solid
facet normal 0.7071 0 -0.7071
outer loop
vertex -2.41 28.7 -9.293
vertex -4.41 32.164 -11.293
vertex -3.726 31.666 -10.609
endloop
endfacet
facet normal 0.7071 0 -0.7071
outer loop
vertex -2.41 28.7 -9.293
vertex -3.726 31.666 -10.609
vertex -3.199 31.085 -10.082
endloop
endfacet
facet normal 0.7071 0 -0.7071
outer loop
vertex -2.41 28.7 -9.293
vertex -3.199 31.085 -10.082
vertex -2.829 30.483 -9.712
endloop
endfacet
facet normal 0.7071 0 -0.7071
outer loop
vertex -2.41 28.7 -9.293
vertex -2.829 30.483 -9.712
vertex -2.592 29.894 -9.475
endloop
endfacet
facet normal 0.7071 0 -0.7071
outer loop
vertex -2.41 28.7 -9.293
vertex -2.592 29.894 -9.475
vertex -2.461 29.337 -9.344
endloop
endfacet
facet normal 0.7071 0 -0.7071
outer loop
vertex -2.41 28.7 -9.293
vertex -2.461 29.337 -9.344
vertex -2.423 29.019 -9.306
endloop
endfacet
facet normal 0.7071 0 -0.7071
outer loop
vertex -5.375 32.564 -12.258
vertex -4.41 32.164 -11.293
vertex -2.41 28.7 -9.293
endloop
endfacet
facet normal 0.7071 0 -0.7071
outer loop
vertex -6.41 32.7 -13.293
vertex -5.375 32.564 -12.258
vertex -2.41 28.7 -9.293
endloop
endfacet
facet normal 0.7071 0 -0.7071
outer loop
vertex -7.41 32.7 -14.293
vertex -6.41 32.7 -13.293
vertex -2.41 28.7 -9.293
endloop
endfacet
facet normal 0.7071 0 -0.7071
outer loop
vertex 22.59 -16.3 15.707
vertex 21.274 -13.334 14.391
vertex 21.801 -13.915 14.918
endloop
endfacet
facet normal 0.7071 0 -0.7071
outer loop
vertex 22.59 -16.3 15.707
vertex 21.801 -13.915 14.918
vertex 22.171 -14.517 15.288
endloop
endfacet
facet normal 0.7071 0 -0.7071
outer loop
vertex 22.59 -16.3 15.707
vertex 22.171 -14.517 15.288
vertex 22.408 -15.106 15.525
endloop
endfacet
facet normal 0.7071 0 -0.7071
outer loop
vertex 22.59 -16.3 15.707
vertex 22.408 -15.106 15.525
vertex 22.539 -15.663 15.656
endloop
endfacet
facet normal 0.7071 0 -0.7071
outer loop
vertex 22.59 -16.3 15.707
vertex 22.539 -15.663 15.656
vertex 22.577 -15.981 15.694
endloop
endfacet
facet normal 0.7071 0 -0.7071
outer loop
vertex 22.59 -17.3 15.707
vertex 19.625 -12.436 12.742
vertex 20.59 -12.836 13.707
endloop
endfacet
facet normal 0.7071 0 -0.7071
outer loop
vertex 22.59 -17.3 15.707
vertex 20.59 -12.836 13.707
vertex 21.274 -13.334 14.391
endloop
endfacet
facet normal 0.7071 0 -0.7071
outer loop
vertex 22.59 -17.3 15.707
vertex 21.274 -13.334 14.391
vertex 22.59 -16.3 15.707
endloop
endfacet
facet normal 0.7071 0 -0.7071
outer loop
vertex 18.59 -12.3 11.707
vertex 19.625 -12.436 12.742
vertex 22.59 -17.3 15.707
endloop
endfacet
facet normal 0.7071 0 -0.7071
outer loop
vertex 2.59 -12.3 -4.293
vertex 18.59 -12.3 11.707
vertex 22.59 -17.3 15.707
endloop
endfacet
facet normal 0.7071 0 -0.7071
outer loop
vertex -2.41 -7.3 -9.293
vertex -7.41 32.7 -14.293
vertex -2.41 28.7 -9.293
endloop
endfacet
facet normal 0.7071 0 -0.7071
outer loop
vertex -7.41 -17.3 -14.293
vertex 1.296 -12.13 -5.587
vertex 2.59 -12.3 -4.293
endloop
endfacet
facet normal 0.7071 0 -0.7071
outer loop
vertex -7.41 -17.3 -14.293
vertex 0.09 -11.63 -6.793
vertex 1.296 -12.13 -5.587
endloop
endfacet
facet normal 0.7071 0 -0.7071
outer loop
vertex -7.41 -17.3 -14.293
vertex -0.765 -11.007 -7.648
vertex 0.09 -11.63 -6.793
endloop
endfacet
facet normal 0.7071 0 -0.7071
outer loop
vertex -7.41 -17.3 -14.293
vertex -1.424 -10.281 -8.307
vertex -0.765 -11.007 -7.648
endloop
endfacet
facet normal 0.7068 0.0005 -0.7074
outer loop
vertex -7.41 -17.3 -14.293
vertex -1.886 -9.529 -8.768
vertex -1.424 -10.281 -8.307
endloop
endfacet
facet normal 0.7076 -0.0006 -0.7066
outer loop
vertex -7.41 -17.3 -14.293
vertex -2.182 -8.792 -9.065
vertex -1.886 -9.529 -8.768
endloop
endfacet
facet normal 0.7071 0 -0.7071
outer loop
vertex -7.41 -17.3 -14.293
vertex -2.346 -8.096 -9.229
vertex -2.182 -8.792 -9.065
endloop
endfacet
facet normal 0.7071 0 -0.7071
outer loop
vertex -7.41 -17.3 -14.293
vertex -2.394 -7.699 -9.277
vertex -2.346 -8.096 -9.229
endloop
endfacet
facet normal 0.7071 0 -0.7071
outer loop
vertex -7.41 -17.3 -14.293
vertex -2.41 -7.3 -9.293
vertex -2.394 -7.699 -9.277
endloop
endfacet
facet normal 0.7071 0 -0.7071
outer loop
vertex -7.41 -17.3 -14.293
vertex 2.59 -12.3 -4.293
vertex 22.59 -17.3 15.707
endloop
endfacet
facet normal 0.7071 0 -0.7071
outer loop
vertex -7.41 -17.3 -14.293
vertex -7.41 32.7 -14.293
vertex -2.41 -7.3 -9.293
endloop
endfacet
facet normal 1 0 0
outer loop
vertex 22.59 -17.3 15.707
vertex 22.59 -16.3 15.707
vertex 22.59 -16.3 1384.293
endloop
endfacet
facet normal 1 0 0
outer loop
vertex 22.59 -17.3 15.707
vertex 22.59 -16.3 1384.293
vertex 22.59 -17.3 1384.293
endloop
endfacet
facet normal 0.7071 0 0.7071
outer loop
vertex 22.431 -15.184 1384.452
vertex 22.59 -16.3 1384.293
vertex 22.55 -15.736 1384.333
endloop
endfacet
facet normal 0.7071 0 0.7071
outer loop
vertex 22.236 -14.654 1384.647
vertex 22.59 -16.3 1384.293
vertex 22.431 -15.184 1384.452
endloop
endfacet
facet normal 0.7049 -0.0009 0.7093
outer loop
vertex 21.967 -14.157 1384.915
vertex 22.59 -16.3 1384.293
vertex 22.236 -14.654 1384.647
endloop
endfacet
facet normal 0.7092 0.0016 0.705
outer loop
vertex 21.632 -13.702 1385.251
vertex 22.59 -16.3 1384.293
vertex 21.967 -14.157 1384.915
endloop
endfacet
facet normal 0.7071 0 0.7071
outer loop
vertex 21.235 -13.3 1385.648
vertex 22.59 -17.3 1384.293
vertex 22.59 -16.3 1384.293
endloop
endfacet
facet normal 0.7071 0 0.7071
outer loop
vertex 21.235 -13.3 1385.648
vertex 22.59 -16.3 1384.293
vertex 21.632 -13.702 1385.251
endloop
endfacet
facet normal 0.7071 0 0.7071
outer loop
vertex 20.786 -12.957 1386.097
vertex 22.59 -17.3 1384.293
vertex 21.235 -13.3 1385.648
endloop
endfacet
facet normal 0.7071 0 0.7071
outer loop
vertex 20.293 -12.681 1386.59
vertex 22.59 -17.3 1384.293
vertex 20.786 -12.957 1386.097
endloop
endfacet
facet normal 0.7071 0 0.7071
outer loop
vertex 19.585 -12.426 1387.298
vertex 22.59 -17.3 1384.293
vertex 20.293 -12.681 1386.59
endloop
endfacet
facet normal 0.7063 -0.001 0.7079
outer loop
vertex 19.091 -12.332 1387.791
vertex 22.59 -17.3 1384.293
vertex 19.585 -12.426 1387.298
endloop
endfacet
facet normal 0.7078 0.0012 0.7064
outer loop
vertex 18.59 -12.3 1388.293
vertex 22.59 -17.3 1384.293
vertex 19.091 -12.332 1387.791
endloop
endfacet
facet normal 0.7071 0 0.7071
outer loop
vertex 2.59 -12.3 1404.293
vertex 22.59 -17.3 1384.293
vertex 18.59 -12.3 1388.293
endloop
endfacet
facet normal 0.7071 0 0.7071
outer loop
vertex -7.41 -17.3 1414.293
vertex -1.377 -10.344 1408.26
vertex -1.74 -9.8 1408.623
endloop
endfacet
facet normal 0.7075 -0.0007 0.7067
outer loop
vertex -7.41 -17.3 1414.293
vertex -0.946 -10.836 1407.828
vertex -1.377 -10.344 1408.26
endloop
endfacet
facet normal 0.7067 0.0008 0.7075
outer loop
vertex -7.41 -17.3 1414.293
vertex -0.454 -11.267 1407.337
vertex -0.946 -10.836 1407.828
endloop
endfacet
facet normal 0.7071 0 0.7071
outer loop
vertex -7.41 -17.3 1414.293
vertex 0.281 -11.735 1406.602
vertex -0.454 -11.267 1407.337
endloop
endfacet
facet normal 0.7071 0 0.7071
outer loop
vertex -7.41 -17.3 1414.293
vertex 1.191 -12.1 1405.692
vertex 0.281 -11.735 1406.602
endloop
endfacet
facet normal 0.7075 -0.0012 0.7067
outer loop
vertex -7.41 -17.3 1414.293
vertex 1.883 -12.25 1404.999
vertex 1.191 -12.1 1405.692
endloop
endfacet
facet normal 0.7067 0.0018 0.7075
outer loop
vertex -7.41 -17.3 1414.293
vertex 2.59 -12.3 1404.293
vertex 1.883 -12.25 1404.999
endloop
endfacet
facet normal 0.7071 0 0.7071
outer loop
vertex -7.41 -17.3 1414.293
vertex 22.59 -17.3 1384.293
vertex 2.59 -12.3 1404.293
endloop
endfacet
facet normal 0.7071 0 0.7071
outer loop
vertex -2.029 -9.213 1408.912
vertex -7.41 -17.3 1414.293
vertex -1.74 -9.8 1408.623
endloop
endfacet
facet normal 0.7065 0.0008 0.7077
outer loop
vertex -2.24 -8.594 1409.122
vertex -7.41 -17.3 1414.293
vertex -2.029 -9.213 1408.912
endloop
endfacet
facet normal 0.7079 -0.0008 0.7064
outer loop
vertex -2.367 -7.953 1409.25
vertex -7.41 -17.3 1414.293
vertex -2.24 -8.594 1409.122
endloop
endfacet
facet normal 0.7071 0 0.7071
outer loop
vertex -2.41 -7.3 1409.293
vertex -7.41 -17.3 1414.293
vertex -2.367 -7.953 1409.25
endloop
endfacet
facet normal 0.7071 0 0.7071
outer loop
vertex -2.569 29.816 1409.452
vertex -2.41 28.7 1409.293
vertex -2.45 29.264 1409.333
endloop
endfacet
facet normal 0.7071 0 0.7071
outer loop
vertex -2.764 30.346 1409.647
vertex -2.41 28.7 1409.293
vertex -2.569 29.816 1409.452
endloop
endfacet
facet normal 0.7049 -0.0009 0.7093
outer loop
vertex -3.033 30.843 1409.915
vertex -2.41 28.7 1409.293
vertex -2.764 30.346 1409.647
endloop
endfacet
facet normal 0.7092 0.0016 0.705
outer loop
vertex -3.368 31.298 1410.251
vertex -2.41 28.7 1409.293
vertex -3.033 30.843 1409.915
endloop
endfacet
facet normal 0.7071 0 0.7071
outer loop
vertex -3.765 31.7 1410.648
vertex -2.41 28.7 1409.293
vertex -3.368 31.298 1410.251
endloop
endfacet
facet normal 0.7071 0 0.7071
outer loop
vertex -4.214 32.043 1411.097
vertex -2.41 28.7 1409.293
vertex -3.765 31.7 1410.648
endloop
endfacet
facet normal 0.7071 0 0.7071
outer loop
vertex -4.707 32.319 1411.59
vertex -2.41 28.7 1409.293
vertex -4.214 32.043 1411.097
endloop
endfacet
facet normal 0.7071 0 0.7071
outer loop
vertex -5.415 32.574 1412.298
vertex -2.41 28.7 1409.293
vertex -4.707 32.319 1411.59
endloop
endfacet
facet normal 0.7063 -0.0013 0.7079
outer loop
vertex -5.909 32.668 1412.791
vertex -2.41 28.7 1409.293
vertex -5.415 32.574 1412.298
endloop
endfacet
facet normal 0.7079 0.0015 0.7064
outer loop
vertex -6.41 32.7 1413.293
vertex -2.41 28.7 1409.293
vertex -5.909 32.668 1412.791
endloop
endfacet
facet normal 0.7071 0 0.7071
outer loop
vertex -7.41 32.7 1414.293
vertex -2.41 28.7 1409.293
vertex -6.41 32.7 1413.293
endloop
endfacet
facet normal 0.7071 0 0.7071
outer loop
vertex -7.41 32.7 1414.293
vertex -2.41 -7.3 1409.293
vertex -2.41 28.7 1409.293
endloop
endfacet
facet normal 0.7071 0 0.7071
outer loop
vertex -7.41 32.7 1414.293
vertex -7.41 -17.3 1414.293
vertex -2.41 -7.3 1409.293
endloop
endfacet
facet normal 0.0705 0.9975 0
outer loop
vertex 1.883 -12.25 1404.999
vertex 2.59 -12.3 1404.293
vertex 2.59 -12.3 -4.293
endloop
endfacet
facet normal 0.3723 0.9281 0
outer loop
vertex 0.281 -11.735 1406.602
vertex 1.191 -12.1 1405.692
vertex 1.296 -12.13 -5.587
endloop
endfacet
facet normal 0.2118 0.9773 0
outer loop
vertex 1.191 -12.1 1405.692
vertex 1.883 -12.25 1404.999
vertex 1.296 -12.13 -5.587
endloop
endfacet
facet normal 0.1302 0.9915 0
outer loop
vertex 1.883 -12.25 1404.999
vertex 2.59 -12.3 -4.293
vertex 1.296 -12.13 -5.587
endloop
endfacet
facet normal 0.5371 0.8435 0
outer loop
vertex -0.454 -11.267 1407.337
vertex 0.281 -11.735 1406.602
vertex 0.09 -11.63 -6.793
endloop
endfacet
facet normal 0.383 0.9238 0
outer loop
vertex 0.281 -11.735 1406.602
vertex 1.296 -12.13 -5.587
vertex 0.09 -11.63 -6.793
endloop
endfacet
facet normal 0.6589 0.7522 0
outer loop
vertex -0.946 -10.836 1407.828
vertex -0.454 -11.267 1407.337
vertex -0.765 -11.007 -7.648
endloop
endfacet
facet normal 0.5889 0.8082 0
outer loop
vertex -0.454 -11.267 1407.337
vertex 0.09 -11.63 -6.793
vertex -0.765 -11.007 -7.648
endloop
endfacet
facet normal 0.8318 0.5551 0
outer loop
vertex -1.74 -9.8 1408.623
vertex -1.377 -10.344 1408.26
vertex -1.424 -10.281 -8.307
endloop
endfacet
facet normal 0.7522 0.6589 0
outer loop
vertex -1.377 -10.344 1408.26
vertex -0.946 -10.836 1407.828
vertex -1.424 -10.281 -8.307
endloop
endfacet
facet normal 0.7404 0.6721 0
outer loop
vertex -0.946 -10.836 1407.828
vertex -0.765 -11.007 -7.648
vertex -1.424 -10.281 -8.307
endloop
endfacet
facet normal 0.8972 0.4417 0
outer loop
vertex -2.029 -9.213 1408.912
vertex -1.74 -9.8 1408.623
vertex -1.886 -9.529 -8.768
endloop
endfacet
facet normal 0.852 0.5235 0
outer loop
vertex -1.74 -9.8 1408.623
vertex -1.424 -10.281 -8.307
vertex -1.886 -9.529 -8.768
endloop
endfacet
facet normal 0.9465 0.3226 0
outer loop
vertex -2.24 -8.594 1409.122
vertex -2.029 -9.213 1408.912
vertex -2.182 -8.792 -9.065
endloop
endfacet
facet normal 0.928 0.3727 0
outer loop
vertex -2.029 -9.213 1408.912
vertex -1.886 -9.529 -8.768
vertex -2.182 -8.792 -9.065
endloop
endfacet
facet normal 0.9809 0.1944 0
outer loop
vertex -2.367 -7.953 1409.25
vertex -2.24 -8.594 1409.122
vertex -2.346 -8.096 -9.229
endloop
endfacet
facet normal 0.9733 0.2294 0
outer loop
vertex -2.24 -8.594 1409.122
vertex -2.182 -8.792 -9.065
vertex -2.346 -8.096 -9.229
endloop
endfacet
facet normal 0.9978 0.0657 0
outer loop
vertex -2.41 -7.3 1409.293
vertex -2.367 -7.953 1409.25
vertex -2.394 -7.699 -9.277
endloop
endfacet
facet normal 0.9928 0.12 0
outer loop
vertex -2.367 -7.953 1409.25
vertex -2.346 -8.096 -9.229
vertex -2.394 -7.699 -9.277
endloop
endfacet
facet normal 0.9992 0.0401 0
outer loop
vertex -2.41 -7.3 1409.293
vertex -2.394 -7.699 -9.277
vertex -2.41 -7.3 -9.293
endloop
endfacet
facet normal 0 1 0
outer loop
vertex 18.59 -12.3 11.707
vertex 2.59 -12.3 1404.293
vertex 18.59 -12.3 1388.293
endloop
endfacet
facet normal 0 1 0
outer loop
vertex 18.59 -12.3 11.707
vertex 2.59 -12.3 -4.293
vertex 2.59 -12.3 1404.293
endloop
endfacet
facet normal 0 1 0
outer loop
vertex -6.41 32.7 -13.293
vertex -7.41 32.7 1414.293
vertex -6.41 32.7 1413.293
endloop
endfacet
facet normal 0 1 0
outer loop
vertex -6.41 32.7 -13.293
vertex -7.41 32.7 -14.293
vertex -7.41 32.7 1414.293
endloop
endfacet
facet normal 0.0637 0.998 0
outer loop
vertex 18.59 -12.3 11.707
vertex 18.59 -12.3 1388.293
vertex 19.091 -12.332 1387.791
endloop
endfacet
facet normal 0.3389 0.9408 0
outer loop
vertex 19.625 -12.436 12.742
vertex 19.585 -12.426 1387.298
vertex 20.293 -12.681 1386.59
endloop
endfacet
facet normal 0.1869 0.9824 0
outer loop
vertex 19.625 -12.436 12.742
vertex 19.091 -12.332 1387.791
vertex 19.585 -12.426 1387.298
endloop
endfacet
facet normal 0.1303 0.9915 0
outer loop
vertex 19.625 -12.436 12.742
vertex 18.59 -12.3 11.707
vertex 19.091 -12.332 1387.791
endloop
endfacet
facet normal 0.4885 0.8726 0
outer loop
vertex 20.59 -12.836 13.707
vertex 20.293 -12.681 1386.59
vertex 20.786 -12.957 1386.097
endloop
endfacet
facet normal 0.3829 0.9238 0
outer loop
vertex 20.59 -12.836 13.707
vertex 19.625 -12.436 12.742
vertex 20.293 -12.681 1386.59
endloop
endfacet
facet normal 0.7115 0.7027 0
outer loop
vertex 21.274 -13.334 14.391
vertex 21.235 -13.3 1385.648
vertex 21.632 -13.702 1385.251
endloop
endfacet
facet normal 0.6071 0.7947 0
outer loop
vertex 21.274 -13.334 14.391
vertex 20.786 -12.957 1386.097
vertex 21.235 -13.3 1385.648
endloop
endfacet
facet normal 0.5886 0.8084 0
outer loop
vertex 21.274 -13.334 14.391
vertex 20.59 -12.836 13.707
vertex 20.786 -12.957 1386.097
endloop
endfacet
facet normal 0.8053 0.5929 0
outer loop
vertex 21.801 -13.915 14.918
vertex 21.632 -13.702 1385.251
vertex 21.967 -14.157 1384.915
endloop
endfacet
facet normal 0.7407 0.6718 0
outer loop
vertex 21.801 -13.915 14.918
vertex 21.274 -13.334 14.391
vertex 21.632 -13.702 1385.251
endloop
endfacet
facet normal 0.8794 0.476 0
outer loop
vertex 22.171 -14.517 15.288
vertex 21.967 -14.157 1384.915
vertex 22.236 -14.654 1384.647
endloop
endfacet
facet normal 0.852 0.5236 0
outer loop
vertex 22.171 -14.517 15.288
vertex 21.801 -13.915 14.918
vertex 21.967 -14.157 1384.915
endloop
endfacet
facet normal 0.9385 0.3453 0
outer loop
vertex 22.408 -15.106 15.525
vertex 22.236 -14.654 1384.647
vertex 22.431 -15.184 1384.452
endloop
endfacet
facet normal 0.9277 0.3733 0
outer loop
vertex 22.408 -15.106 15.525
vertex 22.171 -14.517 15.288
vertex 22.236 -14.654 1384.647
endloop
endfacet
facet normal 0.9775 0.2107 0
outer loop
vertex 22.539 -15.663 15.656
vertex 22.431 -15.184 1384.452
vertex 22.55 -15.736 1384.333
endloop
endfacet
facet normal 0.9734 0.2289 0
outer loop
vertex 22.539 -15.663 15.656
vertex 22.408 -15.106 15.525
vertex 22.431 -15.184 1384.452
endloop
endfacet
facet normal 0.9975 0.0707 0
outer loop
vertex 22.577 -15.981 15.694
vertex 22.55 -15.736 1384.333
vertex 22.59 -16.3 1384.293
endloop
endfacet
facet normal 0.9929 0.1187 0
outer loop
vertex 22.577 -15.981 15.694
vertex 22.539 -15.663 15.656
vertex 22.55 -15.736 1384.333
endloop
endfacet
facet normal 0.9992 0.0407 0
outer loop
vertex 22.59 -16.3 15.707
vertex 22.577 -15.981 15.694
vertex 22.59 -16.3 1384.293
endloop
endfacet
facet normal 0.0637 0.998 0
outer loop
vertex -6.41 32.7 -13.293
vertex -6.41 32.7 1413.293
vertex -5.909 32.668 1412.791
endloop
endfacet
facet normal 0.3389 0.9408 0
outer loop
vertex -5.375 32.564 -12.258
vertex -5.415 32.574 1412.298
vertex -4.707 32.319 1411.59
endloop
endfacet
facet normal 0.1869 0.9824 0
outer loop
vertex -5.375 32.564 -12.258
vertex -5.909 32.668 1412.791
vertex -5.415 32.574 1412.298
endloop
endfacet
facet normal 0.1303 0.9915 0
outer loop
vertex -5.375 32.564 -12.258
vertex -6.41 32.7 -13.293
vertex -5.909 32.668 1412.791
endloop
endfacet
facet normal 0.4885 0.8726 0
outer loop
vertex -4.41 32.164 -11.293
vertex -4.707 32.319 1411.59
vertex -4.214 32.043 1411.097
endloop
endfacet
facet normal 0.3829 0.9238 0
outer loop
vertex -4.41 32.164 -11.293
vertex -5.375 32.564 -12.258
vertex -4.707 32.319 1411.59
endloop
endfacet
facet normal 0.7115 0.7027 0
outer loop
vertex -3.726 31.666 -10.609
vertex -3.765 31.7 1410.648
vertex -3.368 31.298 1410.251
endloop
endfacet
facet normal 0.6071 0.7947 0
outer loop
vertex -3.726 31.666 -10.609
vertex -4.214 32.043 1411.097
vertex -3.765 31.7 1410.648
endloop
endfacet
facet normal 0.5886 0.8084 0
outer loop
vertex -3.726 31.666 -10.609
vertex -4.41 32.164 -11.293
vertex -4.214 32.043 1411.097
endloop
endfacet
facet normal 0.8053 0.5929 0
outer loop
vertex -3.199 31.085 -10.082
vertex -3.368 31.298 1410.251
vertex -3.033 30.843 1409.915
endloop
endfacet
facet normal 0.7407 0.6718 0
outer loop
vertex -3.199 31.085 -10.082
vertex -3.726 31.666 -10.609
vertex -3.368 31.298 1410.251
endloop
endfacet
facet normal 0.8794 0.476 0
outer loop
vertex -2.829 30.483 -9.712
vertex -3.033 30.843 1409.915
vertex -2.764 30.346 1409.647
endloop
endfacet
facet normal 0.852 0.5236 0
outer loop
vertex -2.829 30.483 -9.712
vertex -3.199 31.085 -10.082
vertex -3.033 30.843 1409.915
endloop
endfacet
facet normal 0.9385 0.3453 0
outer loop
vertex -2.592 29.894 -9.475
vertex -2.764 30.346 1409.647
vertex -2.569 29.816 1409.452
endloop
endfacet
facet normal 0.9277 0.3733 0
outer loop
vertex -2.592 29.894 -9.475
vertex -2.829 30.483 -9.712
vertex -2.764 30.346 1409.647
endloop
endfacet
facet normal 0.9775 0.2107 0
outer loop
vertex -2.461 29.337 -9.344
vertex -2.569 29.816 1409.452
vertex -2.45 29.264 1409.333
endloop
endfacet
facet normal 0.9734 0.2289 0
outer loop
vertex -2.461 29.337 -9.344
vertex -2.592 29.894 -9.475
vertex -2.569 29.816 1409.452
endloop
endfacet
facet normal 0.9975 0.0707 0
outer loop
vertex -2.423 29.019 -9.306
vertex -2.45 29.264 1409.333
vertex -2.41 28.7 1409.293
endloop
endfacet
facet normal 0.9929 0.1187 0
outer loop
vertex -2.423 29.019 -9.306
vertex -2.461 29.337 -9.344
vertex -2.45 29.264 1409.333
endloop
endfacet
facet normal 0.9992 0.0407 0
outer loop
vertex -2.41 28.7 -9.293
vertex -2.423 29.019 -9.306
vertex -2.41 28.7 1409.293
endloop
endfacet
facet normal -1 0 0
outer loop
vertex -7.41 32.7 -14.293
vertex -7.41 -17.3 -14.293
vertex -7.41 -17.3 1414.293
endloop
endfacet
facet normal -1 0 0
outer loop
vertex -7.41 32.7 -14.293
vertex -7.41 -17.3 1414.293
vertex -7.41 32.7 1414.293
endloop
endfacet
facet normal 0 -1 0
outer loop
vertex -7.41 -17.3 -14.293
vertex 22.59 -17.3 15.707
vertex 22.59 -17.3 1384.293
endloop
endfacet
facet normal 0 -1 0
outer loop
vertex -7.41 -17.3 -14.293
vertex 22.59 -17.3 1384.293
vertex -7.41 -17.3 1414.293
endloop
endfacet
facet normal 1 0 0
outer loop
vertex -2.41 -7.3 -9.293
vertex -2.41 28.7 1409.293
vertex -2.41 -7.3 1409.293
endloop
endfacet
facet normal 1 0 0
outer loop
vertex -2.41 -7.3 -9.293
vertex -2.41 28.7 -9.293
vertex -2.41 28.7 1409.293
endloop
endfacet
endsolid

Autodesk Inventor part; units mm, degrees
ref_plane "Start Plane" through (0, 0, -14.2929) normal (0, 0, 1) x (1, 0, 0)
ref_plane "End Plane" through (0, 0, 1414.2929) normal (0, 0, 1) x (1, 0, 0)
sketch "Sketch" plane through (0, 0, 0) normal (0, 0, 1) x (1, 0, 0)
  line L0 (-2.41, 28.7) -> (-2.41, -7.3)
  line L1 (-7.41, 32.7) -> (-6.41, 32.7)
  line L2 (-7.41, -17.3) -> (-7.41, 32.7)
  line L3 (22.59, -17.3) -> (-7.41, -17.3)
  line L4 (22.59, -16.3) -> (22.59, -17.3)
  line L5 (2.59, -12.3) -> (18.59, -12.3)
  arc A0 (-2.41, -7.3) -> (2.59, -12.3) centre (2.59, -7.3) ccw
  arc A1 (-2.41, 28.7) -> (-6.41, 32.7) centre (-6.41, 28.7) ccw
  arc A2 (22.59, -16.3) -> (18.59, -12.3) centre (18.59, -16.3) ccw
  line L6 (0, 43.6941) -> (0, -27.4657) construction
  line L7 (-13.5757, 0) -> (29.5841, 0) construction
  point P0 (-2.41, 32.7)
  point P1 (-2.41, -12.3)
  point P2 (22.59, -12.3)
  dimension "d4" = 30
  dimension "d6" = 50
  dimension "d8" = 5
  dimension "d10" = 5
  dimension "d17" = 5
  dimension "d18" = 4
  dimension "d19" = 17.3
  dimension "d20" = 7.41
extrude "Body" add sketch "Sketch" along normal up to surface (1428.5858 mm away) from surface at -14.2929
sketch "Sketch3" plane through (0, 0, 0) normal (0, 0, 1) x (1, 0, 0)
  line L0 (0, 0) -> (10, 0)
ref_plane "Work Plane10" through (0, 0, 0) normal (0, -1, 0) x (1, 0, 0)
sketch "Sketch4" plane through (0, 0, 0) normal (0, -1, 0) x (1, 0, 0)
  line L0 (-2, -14.2929) -> (12, -14.2929)
  line L1 (-2, 1414.2929) -> (12, 1414.2929)
  dimension "d24" = 1428.5858
ref_plane "Work Plane11" through (-7.7636, 7.7, -14.6464) normal (0.7071, 0, -0.7071) x (-0.7071, 0, -0.7071)
split "Split1" plane through (-7.7636, 7.7, -14.6464) removes the side toward (0.7071, 0, -0.7071)
ref_plane "Work Plane12" through (-7.7636, 7.7, 1414.6464) normal (0.7071, 0, 0.7071) x (0.7071, 0, -0.7071)
split "Split2" plane through (-7.7636, 7.7, 1414.6464) removes the side toward (0.7071, 0, 0.7071)
equation "\"d4\" = b"
equation "\"d6\" = ParH"
equation "\"d8\" = ParT"
equation "\"d10\" = ParT"
equation "\"d17\" = R"
equation "\"d18\" = R1"
equation "\"d19\" = ex"
equation "\"d20\" = ey"
equation "\"d11\" = G_L"
equation "\"b\" = 30"
equation "\"ParT\" = 5"
equation "\"R1\" = 4"
equation "\"G_L\" = d24"
equation "\"ParH\" = 50"
equation "\"R\" = 5"
equation "\"ey\" = 7.41"
equation "\"ex\" = 17.3"
equation "\"G_OFFSET_START\" = 14.29289"
equation "\"G_OFFSET_END\" = 14.29289"
equation "\"d21\" = -G_OFFSET_START"
equation "\"d22\" = G_OFFSET_END + B_L"
equation "\"B_L\" = 1400"
properties part number "ISO 657-2 - 50x 30x 5-1428.59" material "Steel, Mild"
